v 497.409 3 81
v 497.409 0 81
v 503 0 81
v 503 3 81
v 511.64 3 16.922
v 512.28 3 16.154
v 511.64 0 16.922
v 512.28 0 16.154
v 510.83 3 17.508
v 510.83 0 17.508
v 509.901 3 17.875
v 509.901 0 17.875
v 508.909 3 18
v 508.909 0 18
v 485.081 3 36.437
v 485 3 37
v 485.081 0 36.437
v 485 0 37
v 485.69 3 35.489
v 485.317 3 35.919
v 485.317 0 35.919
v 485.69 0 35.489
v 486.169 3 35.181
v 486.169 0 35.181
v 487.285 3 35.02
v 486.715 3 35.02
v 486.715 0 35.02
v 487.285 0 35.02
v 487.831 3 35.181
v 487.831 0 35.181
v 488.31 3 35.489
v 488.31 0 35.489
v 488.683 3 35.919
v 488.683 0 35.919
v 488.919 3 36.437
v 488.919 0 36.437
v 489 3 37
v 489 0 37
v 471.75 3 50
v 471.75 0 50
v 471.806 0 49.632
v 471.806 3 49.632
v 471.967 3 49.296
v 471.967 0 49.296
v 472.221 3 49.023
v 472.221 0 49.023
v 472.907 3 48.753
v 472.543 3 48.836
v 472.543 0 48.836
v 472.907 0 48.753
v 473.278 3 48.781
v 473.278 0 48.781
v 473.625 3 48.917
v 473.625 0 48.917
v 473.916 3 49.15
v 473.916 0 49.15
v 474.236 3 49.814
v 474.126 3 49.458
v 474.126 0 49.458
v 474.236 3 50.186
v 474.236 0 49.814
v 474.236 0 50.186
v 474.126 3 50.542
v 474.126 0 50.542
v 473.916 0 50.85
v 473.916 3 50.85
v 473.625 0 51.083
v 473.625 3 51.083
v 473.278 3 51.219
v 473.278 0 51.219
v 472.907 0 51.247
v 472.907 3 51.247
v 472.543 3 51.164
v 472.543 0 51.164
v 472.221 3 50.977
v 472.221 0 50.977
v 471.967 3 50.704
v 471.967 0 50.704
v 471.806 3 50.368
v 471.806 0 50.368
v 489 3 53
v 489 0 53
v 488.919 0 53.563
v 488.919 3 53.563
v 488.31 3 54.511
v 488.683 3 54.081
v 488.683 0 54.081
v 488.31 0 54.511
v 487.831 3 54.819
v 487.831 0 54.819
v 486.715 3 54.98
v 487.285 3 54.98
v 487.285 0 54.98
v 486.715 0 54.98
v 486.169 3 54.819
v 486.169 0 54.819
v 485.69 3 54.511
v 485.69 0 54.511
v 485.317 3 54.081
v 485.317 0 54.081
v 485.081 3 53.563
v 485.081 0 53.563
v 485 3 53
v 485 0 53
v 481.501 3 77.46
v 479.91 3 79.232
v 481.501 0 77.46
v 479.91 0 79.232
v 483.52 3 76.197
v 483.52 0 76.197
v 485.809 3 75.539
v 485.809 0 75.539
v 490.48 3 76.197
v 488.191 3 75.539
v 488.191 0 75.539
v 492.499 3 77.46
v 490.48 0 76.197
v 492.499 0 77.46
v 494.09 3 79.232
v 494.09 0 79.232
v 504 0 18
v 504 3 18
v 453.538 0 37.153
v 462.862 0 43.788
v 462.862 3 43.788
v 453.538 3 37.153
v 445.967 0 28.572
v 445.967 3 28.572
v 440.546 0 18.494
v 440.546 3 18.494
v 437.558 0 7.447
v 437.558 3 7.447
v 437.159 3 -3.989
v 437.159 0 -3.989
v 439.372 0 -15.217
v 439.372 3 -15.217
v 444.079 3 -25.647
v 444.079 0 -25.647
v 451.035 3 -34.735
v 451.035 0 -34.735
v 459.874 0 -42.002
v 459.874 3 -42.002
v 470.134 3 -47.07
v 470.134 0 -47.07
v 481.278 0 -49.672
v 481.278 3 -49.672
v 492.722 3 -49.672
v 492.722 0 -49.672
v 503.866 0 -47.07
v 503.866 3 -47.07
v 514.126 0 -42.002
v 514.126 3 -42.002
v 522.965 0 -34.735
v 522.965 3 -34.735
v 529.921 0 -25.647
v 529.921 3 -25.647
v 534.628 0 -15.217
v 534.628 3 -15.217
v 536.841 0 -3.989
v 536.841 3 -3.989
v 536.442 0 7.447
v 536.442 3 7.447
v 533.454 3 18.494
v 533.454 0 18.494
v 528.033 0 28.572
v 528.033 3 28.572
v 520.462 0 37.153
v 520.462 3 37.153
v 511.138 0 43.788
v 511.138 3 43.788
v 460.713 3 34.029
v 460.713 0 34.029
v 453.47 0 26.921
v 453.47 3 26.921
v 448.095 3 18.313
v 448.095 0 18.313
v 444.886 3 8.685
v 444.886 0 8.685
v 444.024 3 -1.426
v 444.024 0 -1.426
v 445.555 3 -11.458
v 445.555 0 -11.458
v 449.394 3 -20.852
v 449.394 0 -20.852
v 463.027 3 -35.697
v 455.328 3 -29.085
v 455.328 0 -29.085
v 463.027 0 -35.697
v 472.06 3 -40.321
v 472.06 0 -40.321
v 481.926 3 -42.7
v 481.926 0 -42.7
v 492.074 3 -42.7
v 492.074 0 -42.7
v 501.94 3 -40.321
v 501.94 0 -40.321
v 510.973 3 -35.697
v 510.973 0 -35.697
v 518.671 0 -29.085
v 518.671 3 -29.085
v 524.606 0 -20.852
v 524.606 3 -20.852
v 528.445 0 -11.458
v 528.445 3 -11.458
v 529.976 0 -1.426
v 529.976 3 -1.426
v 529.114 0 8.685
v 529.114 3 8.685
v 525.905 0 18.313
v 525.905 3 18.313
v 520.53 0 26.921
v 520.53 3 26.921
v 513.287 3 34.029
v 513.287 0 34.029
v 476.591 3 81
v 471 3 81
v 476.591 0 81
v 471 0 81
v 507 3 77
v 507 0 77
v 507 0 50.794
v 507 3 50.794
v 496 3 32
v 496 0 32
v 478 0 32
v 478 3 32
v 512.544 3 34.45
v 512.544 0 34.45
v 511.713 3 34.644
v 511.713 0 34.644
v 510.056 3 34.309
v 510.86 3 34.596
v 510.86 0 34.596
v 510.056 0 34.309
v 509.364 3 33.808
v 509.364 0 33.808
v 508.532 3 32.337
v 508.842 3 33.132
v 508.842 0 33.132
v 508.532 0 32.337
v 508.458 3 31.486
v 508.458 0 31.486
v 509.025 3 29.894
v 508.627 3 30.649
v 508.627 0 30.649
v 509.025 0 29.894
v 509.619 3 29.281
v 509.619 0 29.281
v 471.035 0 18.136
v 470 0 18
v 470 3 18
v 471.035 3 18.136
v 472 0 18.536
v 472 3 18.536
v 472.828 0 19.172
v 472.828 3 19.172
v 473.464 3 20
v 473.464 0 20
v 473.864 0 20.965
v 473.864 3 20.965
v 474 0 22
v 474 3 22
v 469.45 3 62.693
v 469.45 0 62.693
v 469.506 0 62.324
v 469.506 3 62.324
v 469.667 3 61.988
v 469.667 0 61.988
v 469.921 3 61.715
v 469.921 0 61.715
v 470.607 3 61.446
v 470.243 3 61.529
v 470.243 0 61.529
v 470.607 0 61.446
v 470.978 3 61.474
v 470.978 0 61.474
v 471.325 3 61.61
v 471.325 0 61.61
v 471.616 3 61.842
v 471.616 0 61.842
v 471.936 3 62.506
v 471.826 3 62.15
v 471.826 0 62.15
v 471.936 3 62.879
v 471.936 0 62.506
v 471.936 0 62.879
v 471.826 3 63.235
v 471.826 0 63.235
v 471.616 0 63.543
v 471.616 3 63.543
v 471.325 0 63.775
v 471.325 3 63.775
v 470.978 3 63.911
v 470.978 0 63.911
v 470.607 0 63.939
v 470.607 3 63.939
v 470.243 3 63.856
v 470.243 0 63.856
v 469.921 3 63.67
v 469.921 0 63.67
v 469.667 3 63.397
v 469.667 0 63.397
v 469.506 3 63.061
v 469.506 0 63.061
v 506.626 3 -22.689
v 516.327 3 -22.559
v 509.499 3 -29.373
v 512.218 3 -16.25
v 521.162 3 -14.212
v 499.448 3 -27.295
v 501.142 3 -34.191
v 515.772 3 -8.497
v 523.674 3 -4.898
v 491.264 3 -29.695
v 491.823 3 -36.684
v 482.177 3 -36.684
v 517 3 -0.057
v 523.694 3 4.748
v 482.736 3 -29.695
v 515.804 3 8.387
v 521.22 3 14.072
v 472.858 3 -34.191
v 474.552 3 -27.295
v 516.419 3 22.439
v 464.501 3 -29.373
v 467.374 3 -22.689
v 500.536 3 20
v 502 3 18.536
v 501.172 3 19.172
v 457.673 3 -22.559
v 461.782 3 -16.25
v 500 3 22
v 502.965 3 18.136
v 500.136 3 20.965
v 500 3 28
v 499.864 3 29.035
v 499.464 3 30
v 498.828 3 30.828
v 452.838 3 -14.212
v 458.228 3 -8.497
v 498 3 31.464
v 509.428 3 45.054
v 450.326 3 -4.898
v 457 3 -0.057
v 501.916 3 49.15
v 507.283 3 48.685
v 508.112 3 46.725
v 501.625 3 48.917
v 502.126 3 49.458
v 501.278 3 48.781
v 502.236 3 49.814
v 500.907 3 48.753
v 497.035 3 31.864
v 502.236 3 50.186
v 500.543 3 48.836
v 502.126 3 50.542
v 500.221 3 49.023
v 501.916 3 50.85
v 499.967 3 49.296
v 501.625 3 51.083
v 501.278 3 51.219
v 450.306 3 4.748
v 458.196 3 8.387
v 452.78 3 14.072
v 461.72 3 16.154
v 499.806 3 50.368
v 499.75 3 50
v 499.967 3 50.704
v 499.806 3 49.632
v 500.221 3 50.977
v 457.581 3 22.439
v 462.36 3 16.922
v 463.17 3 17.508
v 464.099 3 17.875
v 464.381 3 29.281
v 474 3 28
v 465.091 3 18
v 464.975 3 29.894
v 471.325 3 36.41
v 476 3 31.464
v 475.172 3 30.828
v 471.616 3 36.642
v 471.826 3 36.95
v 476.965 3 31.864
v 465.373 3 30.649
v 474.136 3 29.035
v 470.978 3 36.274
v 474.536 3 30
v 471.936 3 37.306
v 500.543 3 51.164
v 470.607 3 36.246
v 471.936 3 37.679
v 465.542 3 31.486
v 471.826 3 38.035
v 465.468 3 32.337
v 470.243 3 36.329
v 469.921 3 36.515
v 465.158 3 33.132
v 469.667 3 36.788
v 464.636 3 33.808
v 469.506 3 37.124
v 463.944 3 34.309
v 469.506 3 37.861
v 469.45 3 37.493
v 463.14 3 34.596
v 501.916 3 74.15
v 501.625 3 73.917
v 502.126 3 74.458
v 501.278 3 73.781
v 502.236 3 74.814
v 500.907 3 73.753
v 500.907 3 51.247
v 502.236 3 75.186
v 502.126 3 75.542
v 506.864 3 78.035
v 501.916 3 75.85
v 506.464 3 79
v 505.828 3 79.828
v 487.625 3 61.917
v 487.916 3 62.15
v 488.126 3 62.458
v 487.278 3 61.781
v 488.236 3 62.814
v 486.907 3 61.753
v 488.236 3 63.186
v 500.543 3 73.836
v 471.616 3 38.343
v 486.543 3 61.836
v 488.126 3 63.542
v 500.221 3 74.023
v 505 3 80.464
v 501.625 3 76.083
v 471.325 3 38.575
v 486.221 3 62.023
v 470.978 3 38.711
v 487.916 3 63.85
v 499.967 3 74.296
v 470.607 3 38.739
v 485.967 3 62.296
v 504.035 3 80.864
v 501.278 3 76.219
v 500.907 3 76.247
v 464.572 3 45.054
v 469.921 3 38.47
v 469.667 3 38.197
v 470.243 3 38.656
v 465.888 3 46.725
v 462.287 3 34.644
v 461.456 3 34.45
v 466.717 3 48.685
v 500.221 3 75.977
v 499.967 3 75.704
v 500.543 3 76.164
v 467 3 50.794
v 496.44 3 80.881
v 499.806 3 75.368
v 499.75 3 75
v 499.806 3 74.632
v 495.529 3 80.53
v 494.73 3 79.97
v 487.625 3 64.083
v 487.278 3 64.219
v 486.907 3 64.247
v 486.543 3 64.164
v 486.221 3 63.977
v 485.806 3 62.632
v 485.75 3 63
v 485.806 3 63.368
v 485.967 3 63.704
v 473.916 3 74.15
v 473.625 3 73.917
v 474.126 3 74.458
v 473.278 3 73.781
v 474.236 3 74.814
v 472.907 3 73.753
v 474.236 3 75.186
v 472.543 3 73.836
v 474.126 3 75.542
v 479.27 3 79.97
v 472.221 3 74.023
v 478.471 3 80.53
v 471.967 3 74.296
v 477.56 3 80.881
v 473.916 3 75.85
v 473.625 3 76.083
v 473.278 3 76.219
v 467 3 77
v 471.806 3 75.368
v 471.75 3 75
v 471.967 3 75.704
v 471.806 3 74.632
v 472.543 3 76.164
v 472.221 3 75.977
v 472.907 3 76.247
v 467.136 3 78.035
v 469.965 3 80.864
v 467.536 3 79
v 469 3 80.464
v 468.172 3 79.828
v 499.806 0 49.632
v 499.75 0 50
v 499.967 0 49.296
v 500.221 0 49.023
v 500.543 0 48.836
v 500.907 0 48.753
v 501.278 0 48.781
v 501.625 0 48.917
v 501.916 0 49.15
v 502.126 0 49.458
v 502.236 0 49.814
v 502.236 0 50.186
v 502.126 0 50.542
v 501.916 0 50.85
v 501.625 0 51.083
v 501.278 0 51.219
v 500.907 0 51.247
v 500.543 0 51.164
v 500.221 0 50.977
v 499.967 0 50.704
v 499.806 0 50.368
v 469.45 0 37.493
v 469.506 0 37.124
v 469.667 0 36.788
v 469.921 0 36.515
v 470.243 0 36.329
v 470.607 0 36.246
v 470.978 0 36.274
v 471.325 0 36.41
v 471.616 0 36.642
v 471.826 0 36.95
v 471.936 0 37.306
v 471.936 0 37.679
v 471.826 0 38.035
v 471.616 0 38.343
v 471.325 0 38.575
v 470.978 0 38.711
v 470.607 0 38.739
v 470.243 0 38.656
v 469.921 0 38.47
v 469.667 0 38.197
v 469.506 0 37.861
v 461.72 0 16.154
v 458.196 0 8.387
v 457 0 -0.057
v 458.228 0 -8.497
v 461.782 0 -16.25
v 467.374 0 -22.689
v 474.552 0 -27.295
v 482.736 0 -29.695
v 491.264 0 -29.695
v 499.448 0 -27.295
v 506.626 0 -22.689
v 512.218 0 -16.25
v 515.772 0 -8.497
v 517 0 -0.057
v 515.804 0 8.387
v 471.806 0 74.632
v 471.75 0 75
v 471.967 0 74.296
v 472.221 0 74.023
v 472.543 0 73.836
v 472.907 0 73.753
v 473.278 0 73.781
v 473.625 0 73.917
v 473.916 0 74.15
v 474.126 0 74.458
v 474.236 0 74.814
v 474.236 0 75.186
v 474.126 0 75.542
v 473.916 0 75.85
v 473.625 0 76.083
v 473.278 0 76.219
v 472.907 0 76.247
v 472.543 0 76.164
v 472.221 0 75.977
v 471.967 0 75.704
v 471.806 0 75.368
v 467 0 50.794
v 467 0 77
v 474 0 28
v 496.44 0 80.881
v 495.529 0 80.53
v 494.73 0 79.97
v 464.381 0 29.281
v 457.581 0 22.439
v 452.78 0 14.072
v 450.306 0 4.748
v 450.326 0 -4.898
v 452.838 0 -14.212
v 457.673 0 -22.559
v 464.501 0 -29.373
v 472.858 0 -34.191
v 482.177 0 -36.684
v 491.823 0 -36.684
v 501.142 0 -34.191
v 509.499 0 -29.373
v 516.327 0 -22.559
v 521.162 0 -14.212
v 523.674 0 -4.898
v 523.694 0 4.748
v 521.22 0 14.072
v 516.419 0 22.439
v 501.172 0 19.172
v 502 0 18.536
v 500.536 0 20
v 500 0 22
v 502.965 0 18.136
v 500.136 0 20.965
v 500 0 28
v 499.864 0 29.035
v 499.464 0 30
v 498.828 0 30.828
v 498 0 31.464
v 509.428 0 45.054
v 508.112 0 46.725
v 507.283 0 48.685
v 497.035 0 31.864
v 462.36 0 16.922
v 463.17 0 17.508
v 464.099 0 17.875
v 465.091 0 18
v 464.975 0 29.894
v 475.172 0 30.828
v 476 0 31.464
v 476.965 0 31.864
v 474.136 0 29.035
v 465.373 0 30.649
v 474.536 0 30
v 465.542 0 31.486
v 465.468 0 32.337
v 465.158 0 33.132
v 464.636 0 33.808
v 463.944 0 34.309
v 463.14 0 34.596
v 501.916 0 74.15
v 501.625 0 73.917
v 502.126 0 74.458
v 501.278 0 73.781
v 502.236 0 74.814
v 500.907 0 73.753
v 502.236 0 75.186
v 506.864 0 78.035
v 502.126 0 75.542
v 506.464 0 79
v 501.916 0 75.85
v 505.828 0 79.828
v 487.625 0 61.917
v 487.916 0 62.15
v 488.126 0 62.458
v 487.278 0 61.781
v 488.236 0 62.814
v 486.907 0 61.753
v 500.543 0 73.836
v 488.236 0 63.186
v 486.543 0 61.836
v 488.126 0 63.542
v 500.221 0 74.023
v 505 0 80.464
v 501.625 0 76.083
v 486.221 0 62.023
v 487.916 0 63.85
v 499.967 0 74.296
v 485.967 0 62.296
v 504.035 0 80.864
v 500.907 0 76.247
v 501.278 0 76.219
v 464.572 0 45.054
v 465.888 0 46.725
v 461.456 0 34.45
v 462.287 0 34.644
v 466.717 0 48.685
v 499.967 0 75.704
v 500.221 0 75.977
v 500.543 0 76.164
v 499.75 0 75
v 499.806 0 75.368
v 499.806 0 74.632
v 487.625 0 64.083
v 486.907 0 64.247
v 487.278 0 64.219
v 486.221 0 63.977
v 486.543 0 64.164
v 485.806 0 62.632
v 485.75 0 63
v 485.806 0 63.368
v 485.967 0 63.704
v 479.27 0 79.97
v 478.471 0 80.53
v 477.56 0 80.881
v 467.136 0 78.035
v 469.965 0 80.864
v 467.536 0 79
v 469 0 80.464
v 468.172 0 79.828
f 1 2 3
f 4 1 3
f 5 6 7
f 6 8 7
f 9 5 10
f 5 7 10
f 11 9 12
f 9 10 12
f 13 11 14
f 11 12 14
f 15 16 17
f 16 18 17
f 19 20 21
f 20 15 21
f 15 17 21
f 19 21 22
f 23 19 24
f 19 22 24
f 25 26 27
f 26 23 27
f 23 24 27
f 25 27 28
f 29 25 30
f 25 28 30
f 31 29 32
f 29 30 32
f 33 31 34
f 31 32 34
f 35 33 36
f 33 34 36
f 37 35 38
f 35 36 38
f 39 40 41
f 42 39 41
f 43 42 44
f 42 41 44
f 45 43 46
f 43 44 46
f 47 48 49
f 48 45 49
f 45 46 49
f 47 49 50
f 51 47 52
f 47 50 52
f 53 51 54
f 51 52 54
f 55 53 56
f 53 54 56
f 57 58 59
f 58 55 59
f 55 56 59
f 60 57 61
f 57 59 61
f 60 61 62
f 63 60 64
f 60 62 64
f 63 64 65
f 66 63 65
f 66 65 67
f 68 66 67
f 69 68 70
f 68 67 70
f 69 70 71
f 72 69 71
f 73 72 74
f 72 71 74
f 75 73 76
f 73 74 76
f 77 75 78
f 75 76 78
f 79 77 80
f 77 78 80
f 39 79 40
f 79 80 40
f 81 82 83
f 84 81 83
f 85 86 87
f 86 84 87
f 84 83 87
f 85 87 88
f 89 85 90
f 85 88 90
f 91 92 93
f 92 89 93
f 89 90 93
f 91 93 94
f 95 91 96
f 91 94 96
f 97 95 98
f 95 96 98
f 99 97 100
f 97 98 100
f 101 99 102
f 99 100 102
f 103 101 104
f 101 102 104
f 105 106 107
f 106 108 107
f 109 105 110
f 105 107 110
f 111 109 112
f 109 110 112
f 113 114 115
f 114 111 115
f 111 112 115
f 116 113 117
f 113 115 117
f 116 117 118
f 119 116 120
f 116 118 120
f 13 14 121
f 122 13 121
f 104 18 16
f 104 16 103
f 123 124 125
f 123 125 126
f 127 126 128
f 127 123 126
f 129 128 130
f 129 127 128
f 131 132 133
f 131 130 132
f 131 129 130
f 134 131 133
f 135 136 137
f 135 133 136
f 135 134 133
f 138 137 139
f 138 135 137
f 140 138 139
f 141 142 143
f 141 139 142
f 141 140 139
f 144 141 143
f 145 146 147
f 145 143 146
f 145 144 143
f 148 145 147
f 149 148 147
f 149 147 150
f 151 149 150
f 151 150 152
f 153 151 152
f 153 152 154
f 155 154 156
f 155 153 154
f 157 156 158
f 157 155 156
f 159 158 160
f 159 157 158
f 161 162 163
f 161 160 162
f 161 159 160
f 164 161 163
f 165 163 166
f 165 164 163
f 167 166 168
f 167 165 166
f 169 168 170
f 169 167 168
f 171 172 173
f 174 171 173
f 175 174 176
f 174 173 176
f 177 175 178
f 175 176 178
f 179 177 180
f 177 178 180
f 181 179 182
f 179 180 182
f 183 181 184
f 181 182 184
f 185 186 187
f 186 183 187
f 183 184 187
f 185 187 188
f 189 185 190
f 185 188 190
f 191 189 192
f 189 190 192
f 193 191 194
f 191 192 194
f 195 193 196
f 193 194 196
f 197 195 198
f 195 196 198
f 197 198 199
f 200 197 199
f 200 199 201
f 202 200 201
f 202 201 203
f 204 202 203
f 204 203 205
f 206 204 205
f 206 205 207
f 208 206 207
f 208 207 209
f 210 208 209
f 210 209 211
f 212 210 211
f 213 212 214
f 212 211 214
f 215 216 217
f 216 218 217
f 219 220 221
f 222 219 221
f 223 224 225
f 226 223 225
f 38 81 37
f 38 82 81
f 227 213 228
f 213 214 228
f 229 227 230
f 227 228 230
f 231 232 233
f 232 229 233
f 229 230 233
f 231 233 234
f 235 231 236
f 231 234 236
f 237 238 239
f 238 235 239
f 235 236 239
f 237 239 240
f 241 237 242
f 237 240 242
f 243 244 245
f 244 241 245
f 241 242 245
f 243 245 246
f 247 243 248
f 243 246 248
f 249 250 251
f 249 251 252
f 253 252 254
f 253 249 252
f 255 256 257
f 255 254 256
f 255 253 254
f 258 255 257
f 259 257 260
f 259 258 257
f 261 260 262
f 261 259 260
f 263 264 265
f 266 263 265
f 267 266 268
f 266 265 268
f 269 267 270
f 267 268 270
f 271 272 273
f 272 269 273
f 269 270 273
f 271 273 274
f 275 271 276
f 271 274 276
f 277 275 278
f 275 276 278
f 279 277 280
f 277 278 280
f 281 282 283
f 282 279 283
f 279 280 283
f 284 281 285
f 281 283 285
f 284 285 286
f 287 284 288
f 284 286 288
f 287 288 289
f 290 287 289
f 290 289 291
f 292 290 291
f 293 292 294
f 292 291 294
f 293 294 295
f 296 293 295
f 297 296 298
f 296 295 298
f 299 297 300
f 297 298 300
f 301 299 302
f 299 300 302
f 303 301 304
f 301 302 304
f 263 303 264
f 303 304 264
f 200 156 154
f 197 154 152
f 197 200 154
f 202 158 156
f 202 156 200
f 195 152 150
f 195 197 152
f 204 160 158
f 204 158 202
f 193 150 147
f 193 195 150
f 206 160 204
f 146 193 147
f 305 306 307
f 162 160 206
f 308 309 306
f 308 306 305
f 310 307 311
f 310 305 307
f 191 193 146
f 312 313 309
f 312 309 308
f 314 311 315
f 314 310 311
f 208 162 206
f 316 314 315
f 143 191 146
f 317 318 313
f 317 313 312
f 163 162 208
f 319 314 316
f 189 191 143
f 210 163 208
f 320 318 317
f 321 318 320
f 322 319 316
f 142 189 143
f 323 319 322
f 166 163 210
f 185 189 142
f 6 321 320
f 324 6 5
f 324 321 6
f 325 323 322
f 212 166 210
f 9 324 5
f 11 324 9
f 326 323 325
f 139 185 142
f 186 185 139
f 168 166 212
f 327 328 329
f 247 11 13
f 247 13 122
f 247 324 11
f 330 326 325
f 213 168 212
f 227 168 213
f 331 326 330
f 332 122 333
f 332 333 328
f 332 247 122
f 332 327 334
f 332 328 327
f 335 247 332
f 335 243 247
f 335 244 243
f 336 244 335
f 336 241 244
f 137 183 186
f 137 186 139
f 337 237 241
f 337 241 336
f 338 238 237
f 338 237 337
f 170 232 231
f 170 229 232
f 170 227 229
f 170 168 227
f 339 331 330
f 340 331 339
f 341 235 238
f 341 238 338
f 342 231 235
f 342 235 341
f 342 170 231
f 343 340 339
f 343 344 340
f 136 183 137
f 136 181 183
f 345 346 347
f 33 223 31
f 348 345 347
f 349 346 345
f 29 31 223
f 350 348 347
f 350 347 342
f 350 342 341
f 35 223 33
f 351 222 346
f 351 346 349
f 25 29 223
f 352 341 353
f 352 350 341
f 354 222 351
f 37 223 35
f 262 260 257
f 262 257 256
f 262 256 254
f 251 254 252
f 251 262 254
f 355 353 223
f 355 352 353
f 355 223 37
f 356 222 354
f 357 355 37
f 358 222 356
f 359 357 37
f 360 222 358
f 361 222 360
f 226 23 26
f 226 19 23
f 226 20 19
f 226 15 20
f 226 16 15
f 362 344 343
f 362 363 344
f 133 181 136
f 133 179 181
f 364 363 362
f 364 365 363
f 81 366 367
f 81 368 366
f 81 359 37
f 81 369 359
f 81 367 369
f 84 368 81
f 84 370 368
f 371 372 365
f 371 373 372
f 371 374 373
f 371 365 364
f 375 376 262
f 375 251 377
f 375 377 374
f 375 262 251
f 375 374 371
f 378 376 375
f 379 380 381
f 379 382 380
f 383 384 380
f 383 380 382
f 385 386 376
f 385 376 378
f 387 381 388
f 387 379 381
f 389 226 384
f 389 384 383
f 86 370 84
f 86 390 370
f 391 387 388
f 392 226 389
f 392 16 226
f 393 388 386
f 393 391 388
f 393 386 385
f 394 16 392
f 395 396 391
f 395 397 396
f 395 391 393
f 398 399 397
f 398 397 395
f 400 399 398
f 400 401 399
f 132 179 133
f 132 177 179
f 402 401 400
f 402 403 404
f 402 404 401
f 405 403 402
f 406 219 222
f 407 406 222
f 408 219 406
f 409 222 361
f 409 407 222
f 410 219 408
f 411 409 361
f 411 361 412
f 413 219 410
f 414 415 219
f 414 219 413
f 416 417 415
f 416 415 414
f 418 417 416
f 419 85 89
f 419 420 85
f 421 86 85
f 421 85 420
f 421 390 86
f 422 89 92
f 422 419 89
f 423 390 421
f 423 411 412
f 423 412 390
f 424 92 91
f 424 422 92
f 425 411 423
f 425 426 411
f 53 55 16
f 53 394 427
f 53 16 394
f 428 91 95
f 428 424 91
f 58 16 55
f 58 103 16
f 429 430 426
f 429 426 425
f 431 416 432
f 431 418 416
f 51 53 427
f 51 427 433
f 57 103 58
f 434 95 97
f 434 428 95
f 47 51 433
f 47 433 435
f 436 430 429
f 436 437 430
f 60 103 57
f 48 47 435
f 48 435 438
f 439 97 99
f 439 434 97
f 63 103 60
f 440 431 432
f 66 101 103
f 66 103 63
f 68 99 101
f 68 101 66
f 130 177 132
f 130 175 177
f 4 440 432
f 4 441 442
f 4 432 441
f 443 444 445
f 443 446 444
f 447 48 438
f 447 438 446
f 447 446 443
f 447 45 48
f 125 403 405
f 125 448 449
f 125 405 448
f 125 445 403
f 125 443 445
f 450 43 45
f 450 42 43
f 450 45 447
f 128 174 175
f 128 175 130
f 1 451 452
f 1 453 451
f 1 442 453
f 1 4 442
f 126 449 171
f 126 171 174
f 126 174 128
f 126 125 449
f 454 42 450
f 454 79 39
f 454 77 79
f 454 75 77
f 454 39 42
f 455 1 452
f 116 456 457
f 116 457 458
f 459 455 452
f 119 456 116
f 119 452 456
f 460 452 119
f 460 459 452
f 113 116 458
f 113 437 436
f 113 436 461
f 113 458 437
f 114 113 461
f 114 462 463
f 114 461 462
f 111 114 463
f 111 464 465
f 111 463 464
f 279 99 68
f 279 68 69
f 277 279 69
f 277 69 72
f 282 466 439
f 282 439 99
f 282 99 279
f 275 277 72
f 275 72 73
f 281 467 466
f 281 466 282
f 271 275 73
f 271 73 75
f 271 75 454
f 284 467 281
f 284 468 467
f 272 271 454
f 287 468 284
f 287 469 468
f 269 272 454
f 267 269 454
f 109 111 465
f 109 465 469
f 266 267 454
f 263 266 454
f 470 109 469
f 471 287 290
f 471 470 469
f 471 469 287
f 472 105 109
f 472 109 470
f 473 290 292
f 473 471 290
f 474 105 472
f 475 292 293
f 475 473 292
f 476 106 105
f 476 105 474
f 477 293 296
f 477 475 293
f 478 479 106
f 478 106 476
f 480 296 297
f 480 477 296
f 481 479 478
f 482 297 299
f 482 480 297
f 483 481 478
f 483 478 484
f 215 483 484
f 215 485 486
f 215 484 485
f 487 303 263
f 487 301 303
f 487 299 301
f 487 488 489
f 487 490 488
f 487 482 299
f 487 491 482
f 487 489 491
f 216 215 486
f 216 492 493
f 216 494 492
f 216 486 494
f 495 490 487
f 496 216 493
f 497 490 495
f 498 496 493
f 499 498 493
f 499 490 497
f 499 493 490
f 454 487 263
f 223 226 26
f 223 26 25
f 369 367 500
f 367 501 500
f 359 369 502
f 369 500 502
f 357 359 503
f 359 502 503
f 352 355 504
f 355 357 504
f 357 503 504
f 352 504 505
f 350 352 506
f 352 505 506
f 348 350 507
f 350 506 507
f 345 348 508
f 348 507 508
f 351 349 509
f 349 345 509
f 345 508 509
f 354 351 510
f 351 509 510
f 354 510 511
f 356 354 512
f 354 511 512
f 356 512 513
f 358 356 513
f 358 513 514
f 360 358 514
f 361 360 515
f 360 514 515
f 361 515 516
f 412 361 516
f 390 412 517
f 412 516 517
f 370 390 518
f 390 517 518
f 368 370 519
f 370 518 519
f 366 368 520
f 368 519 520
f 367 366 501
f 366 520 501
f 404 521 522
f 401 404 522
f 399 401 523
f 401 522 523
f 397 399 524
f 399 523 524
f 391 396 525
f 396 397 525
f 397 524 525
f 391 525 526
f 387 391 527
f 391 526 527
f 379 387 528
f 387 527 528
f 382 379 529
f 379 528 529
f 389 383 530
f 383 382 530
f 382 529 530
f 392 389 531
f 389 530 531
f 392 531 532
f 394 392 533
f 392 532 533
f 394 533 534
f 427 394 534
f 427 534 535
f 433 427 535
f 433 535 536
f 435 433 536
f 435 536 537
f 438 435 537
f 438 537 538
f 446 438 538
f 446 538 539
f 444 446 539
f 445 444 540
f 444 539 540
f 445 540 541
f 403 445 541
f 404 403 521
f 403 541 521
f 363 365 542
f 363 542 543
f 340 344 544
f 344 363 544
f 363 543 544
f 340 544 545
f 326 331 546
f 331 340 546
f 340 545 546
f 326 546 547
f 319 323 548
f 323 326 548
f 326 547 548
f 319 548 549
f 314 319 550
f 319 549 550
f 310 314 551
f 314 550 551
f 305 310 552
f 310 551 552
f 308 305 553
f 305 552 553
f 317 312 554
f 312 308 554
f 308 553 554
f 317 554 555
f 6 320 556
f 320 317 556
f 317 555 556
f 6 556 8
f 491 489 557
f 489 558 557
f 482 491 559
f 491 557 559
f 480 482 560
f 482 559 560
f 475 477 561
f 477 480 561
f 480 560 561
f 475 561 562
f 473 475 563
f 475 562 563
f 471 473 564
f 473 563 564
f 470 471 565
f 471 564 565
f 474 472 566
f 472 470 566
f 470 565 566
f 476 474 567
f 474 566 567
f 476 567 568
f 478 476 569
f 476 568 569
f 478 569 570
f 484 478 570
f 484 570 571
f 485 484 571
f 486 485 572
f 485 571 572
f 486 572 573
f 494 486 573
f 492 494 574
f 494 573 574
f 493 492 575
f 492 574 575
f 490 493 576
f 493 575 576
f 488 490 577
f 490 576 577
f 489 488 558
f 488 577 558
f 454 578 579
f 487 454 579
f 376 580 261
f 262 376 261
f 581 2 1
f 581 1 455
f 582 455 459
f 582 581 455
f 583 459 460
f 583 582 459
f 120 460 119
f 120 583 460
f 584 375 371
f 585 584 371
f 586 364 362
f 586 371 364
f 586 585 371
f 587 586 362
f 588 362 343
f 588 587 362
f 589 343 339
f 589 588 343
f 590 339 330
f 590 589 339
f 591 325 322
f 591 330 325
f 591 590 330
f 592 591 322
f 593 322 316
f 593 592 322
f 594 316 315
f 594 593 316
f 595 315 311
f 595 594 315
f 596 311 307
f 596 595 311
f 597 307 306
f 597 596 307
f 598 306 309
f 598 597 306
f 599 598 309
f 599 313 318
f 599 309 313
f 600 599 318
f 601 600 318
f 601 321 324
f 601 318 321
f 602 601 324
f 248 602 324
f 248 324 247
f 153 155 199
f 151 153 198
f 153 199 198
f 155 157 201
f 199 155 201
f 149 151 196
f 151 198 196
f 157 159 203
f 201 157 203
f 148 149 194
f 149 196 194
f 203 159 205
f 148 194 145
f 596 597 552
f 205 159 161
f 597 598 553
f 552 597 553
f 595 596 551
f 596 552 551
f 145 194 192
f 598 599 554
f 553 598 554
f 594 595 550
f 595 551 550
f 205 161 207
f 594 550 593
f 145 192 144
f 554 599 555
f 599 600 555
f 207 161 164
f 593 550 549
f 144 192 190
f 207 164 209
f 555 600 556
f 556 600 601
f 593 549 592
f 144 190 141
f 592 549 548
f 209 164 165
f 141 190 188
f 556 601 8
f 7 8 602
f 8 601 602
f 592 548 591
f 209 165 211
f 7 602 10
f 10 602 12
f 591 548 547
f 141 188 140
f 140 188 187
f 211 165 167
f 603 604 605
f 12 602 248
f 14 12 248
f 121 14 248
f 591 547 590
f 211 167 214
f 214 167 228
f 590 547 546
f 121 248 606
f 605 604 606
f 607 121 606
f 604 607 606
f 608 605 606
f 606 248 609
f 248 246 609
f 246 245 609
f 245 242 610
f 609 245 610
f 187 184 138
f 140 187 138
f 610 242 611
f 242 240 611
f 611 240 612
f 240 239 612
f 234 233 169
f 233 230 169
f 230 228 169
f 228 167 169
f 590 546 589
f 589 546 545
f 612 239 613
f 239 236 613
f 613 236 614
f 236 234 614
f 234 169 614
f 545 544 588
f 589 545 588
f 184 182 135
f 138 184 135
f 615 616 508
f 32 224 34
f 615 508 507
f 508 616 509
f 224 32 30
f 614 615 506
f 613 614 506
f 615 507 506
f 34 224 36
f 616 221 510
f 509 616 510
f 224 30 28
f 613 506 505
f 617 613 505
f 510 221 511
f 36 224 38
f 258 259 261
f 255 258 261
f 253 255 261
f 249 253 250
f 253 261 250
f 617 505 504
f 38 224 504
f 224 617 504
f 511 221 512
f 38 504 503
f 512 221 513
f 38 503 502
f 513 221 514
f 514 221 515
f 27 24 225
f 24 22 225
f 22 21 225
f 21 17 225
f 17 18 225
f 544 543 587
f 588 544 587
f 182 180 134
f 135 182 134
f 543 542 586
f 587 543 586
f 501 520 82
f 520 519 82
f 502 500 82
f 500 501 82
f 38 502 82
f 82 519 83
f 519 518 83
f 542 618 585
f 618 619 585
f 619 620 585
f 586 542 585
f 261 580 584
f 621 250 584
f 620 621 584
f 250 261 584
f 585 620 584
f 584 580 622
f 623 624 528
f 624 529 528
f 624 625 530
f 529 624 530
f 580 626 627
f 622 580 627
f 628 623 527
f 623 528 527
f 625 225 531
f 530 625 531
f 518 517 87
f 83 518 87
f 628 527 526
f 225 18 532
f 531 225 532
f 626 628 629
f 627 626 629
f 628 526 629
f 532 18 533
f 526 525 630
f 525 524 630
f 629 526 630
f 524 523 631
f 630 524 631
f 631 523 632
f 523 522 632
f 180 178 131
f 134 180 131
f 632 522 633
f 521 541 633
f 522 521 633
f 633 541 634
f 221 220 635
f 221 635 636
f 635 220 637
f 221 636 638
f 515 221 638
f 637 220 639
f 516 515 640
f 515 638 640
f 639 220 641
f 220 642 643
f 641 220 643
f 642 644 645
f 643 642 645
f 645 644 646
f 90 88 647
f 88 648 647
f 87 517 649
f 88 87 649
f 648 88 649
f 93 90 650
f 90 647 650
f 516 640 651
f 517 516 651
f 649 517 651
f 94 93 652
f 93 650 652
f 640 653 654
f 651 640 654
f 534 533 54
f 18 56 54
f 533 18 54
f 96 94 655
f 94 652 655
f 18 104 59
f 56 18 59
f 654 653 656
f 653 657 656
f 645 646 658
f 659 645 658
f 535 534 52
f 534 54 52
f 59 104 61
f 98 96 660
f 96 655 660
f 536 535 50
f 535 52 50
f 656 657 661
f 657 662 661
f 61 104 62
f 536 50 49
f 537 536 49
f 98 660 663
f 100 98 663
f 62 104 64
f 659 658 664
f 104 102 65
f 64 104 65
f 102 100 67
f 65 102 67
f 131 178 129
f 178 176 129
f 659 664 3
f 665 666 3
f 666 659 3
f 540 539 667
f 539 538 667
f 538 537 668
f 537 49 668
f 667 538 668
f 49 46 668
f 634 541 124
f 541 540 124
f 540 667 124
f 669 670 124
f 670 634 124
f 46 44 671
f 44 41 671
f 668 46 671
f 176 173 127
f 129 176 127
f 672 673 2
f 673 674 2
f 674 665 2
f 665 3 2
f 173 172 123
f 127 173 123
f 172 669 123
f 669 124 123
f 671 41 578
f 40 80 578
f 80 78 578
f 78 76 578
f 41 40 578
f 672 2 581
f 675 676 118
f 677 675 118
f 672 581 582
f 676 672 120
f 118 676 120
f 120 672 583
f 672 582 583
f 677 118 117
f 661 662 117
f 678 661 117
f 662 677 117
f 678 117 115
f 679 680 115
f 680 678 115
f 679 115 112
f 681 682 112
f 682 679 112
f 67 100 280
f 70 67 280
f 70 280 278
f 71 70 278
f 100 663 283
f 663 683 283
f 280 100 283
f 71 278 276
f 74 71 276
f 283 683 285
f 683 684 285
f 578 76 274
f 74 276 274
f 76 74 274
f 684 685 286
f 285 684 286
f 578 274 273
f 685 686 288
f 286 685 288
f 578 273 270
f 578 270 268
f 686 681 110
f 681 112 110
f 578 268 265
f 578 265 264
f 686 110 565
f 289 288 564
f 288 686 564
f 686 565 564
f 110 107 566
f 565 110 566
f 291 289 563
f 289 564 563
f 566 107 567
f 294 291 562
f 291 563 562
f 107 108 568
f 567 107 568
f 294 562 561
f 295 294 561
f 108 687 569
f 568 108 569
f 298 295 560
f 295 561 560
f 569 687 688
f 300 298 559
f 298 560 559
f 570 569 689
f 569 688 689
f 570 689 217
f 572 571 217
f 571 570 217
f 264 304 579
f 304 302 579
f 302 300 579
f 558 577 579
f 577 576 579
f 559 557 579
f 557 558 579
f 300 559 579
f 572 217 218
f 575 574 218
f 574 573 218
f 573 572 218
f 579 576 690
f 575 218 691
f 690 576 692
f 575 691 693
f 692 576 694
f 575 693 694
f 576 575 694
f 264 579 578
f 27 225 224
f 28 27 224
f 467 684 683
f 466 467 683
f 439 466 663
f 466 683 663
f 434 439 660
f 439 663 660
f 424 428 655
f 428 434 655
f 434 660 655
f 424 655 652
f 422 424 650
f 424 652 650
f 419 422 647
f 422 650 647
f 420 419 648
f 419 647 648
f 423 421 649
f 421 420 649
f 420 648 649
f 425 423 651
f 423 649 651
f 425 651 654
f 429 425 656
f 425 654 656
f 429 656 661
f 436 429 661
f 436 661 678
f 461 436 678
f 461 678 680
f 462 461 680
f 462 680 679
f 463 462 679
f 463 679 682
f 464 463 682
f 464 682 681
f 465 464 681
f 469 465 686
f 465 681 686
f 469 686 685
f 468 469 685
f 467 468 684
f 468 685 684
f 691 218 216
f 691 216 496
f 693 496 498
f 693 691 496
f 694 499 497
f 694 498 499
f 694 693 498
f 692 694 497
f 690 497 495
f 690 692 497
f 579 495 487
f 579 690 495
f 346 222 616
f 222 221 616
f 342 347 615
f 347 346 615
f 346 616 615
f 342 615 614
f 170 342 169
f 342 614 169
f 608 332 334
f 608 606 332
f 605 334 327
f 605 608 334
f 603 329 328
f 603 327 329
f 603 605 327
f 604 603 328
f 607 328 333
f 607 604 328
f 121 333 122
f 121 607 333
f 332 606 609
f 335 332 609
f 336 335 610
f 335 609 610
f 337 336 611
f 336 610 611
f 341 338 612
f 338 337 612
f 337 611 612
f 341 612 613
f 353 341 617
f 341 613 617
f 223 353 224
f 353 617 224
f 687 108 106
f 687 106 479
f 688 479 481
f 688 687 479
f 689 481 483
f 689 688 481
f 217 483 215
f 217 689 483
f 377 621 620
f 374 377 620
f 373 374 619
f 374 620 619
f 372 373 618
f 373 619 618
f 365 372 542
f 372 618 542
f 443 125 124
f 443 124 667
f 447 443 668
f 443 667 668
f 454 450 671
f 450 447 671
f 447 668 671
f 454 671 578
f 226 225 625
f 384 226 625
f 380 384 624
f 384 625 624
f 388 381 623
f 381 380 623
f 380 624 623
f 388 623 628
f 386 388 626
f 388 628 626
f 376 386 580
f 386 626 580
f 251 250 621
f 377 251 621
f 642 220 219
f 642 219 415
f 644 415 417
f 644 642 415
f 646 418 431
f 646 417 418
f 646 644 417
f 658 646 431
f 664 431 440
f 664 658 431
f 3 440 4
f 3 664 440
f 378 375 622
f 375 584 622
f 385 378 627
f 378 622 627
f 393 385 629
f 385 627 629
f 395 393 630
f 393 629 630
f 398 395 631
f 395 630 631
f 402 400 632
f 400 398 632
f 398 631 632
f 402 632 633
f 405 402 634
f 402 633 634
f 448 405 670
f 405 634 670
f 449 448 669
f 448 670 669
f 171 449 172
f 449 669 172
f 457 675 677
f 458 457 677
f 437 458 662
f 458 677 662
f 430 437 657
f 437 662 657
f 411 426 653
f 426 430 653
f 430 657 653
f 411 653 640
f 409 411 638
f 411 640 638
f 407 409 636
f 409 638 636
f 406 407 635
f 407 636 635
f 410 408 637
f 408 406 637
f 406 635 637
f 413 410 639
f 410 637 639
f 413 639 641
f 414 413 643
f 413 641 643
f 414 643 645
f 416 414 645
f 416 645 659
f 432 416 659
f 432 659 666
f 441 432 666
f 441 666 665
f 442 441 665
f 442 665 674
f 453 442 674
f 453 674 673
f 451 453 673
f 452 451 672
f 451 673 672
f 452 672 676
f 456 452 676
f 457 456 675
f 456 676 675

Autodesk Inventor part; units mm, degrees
ref_plane "YZ Plane" through (0, 0, 0) normal (1, 0, 0) x (0, 1, 0)
ref_plane "XZ Plane" through (0, 0, 0) normal (0, 1, 0) x (-1, 0, 0)
ref_plane "XY Plane" through (0, 0, 0) normal (0, 0, 1) x (1, 0, 0)
sketch3d "3D Sketch1"
sketch "Sketch8" plane through (0, 0, 0) normal (0, 1, 0) x (-1, 0, 0)
  arc A0 (-533.9727, 129.2939) -> (-533.9727, 72.7061) centre (-524, 101) ccw projected
  arc A1 (-533.9727, 129.2939) -> (-540.6211, 148.1565) centre (-537.2969, 138.7252) ccw projected
  arc A2 (-540.6211, 148.1565) -> (-540.6211, 53.8435) centre (-524, 101) ccw projected
  arc A3 (-540.6211, 53.8435) -> (-533.9727, 72.7061) centre (-537.2969, 63.2748) ccw projected
  circle A4 centre (-537.2969, 63.2748) radius 3 projected
  circle A5 centre (-556.6482, 77.8001) radius 2.9994 projected
  circle A6 centre (-564, 101) radius 3 projected
  circle A7 centre (-556.6482, 124.1094) radius 2.9994 projected
  circle A8 centre (-537.2969, 138.7252) radius 3 projected
  line L0 (-531, 98.5) -> (-531, 115.5) projected
  line L1 (-451.3425, 101.8066) -> (-466.8633, 88.0104) projected
  arc A9 (-451.3425, 101.8066) -> (-450, 104.7963) centre (-454, 104.7963) ccw projected
  line L2 (-450, 109.2037) -> (-450, 104.7963) projected
  arc A10 (-450, 109.2037) -> (-451.3425, 112.1934) centre (-454, 109.2037) ccw projected
  line L3 (-466.8633, 125.9896) -> (-451.3425, 112.1934) projected
  arc A11 (-466.8633, 125.9896) -> (-469.5208, 127) centre (-469.5208, 123) ccw projected
  line L4 (-505.0775, 127) -> (-469.5208, 127) projected
  arc A12 (-505.0775, 127) -> (-508.201, 125.4988) centre (-505.0775, 123) ccw projected
  line L5 (-511.799, 121.0012) -> (-508.201, 125.4988) projected
  arc A13 (-514.9225, 119.5) -> (-511.799, 121.0012) centre (-514.9225, 123.5) ccw projected
  line L6 (-527, 119.5) -> (-514.9225, 119.5) projected
  arc A14 (-527, 119.5) -> (-531, 115.5) centre (-527, 115.5) ccw projected
  arc A15 (-531, 98.5) -> (-527, 94.5) centre (-527, 98.5) ccw projected
  line L7 (-514.9225, 94.5) -> (-527, 94.5) projected
  arc A16 (-511.799, 92.9988) -> (-514.9225, 94.5) centre (-514.9225, 90.5) ccw projected
  line L8 (-508.201, 88.5012) -> (-511.799, 92.9988) projected
  arc A17 (-508.201, 88.5012) -> (-505.0775, 87) centre (-505.0775, 91) ccw projected
  line L9 (-469.5208, 87) -> (-505.0775, 87) projected
  line L10 (-478, 91.45) -> (-470, 91.45) projected
  arc A18 (-470, 91.45) -> (-470, 94.55) centre (-470, 93) ccw projected
  line L11 (-470, 94.55) -> (-478, 94.55) projected
  arc A19 (-478, 94.55) -> (-478, 91.45) centre (-478, 93) ccw projected
  arc A20 (-495, 91.45) -> (-495, 94.55) centre (-495, 93) ccw projected
  line L12 (-503, 91.45) -> (-495, 91.45) projected
  arc A21 (-503, 94.55) -> (-503, 91.45) centre (-503, 93) ccw projected
  line L13 (-495, 94.55) -> (-503, 94.55) projected
  line L14 (-455, 105.5) -> (-469, 105.5) projected
  arc A22 (-455, 105.5) -> (-455, 108.5) centre (-455, 107) ccw projected
  line L15 (-469, 108.5) -> (-455, 108.5) projected
  arc A23 (-469, 108.5) -> (-469, 105.5) centre (-469, 107) ccw projected
  arc A24 (-482, 105.45) -> (-482, 108.55) centre (-482, 107) ccw projected
  line L16 (-490, 105.45) -> (-482, 105.45) projected
  arc A25 (-490, 108.55) -> (-490, 105.45) centre (-490, 107) ccw projected
  line L17 (-482, 108.55) -> (-490, 108.55) projected
  line L18 (-501, 109) -> (-501, 105) projected
  line L19 (-501, 105) -> (-511, 105) projected
  line L20 (-511, 105) -> (-511, 109) projected
  line L21 (-511, 109) -> (-501, 109) projected
  circle A26 centre (-525.75, 100) radius 1.55 projected
  circle A27 centre (-525.75, 114) radius 1.55 projected
  arc A28 (-503, 122.55) -> (-503, 119.45) centre (-503, 121) ccw projected
  line L22 (-503, 122.55) -> (-495, 122.55) projected
  arc A29 (-495, 119.45) -> (-495, 122.55) centre (-495, 121) ccw projected
  line L23 (-495, 119.45) -> (-503, 119.45) projected
  arc A30 (-478, 122.55) -> (-478, 119.45) centre (-478, 121) ccw projected
  line L24 (-478, 122.55) -> (-470, 122.55) projected
  arc A31 (-470, 119.45) -> (-470, 122.55) centre (-470, 121) ccw projected
  line L25 (-470, 119.45) -> (-478, 119.45) projected
  arc A32 (-469.5208, 87) -> (-466.8633, 88.0104) centre (-469.5208, 91) ccw projected
  line L26 (-487, 7.43) -> (-478.1, 7.43) projected
  line L27 (-495.9, 7.43) -> (-487, 7.43) projected
  arc A33 (-495.9, 7.43) -> (-499.5, 3.83) centre (-495.9, 3.83) ccw projected
  line L28 (-499.5, -0.5942) -> (-499.5, 3.83) projected
  arc A34 (-499.5, -0.5942) -> (-498.1907, -3.5539) centre (-495.5, -0.5942) ccw projected
  line L29 (-490, -11) -> (-498.1907, -3.5539) projected
  line L30 (-484, -11) -> (-490, -11) projected
  line L31 (-475.8093, -3.5539) -> (-484, -11) projected
  arc A35 (-475.8093, -3.5539) -> (-474.5, -0.5942) centre (-478.5, -0.5942) ccw projected
  line L32 (-474.5, 3.83) -> (-474.5, -0.5942) projected
  arc A36 (-474.5, 3.83) -> (-478.1, 7.43) centre (-478.1, 3.83) ccw projected
  arc A37 (-478.45, 4) -> (-481.55, 4) centre (-480, 4) ccw projected
  line L33 (-481.55, 4) -> (-481.55, -1) projected
  arc A38 (-481.55, -1) -> (-478.45, -1) centre (-480, -1) ccw projected
  line L34 (-478.45, -1) -> (-478.45, 4) projected
  line L35 (-492.45, 4) -> (-492.45, -1) projected
  arc A39 (-492.45, 4) -> (-495.55, 4) centre (-494, 4) ccw projected
  line L36 (-495.55, -1) -> (-495.55, 4) projected
  arc A40 (-495.55, -1) -> (-492.45, -1) centre (-494, -1) ccw projected
  arc A41 (-494.09, 79.2321) -> (-479.91, 79.2321) centre (-487, 84) ccw projected
  arc A42 (-494.09, 79.2321) -> (-497.4092, 81) centre (-497.4092, 77) ccw projected
  line L37 (-497.4092, 81) -> (-503, 81) projected
  arc A43 (-503, 81) -> (-507, 77) centre (-503, 77) ccw projected
  line L38 (-507, 77) -> (-507, 50.7937) projected
  arc A44 (-511.1379, 43.7877) -> (-507, 50.7937) centre (-515, 50.7937) ccw projected
  arc A45 (-511.1379, 43.7877) -> (-462.8621, 43.7877) centre (-487, 0) ccw projected
  arc A46 (-467, 50.7937) -> (-462.8621, 43.7877) centre (-459, 50.7937) ccw projected
  line L39 (-467, 50.7937) -> (-467, 77) projected
  arc A47 (-467, 77) -> (-471, 81) centre (-471, 77) ccw projected
  line L40 (-471, 81) -> (-476.5908, 81) projected
  arc A48 (-476.5908, 81) -> (-479.91, 79.2321) centre (-476.5908, 77) ccw projected
  circle A49 centre (-473, 75) radius 1.25 projected
  circle A50 centre (-501, 75) radius 1.25 projected
  circle A51 centre (-487, 63) radius 1.25 projected
  circle A52 centre (-470.7, 62.6926) radius 1.25 projected
  circle A53 centre (-473, 50) radius 1.25 projected
  circle A54 centre (-501, 50) radius 1.25 projected
  circle A55 centre (-470.7, 37.4926) radius 1.25 projected
  arc A56 (-485, 53) -> (-489, 53) centre (-487, 53) ccw projected
  line L41 (-485, 37) -> (-485, 53) projected
  line L42 (-489, 53) -> (-489, 37) projected
  arc A57 (-489, 37) -> (-485, 37) centre (-487, 37) ccw projected
  arc A58 (-513.2873, 34.029) -> (-460.7127, 34.0291) centre (-487, 0) ccw projected
  arc A59 (-509.6193, 29.2808) -> (-464.3807, 29.2808) centre (-487, 0) ccw projected
  arc A60 (-460.7127, 34.0291) -> (-464.3807, 29.2808) centre (-462.5467, 31.6549) ccw projected
  arc A61 (-509.6193, 29.2808) -> (-513.2873, 34.029) centre (-511.4533, 31.6549) ccw projected
  arc A62 (-496, 32) -> (-500, 28) centre (-496, 28) ccw projected
  line L43 (-496, 32) -> (-478, 32) projected
  arc A63 (-474, 28) -> (-478, 32) centre (-478, 28) ccw projected
  line L44 (-474, 28) -> (-474, 22) projected
  arc A64 (-474, 22) -> (-470, 18) centre (-470, 22) ccw projected
  line L45 (-470, 18) -> (-465.0911, 18) projected
  arc A65 (-461.7205, 16.1538) -> (-465.0911, 18) centre (-465.0911, 14) ccw projected
  arc A66 (-512.2795, 16.1538) -> (-461.7205, 16.1538) centre (-487, 0) ccw projected
  arc A67 (-508.9089, 18) -> (-512.2795, 16.1538) centre (-508.9089, 14) ccw projected
  line L46 (-508.9089, 18) -> (-504, 18) projected
  arc A68 (-504, 18) -> (-500, 22) centre (-504, 22) ccw projected
  line L47 (-500, 22) -> (-500, 28) projected
  point P0 (0, 0)
extrude "Extrusion1" add sketch "Sketch8" along normal blind 3 contours A41 A48 L40 A47 L39 A46 A45 A44 L38 A43 L37 A42
properties part number "pulsador_monta_riel"
